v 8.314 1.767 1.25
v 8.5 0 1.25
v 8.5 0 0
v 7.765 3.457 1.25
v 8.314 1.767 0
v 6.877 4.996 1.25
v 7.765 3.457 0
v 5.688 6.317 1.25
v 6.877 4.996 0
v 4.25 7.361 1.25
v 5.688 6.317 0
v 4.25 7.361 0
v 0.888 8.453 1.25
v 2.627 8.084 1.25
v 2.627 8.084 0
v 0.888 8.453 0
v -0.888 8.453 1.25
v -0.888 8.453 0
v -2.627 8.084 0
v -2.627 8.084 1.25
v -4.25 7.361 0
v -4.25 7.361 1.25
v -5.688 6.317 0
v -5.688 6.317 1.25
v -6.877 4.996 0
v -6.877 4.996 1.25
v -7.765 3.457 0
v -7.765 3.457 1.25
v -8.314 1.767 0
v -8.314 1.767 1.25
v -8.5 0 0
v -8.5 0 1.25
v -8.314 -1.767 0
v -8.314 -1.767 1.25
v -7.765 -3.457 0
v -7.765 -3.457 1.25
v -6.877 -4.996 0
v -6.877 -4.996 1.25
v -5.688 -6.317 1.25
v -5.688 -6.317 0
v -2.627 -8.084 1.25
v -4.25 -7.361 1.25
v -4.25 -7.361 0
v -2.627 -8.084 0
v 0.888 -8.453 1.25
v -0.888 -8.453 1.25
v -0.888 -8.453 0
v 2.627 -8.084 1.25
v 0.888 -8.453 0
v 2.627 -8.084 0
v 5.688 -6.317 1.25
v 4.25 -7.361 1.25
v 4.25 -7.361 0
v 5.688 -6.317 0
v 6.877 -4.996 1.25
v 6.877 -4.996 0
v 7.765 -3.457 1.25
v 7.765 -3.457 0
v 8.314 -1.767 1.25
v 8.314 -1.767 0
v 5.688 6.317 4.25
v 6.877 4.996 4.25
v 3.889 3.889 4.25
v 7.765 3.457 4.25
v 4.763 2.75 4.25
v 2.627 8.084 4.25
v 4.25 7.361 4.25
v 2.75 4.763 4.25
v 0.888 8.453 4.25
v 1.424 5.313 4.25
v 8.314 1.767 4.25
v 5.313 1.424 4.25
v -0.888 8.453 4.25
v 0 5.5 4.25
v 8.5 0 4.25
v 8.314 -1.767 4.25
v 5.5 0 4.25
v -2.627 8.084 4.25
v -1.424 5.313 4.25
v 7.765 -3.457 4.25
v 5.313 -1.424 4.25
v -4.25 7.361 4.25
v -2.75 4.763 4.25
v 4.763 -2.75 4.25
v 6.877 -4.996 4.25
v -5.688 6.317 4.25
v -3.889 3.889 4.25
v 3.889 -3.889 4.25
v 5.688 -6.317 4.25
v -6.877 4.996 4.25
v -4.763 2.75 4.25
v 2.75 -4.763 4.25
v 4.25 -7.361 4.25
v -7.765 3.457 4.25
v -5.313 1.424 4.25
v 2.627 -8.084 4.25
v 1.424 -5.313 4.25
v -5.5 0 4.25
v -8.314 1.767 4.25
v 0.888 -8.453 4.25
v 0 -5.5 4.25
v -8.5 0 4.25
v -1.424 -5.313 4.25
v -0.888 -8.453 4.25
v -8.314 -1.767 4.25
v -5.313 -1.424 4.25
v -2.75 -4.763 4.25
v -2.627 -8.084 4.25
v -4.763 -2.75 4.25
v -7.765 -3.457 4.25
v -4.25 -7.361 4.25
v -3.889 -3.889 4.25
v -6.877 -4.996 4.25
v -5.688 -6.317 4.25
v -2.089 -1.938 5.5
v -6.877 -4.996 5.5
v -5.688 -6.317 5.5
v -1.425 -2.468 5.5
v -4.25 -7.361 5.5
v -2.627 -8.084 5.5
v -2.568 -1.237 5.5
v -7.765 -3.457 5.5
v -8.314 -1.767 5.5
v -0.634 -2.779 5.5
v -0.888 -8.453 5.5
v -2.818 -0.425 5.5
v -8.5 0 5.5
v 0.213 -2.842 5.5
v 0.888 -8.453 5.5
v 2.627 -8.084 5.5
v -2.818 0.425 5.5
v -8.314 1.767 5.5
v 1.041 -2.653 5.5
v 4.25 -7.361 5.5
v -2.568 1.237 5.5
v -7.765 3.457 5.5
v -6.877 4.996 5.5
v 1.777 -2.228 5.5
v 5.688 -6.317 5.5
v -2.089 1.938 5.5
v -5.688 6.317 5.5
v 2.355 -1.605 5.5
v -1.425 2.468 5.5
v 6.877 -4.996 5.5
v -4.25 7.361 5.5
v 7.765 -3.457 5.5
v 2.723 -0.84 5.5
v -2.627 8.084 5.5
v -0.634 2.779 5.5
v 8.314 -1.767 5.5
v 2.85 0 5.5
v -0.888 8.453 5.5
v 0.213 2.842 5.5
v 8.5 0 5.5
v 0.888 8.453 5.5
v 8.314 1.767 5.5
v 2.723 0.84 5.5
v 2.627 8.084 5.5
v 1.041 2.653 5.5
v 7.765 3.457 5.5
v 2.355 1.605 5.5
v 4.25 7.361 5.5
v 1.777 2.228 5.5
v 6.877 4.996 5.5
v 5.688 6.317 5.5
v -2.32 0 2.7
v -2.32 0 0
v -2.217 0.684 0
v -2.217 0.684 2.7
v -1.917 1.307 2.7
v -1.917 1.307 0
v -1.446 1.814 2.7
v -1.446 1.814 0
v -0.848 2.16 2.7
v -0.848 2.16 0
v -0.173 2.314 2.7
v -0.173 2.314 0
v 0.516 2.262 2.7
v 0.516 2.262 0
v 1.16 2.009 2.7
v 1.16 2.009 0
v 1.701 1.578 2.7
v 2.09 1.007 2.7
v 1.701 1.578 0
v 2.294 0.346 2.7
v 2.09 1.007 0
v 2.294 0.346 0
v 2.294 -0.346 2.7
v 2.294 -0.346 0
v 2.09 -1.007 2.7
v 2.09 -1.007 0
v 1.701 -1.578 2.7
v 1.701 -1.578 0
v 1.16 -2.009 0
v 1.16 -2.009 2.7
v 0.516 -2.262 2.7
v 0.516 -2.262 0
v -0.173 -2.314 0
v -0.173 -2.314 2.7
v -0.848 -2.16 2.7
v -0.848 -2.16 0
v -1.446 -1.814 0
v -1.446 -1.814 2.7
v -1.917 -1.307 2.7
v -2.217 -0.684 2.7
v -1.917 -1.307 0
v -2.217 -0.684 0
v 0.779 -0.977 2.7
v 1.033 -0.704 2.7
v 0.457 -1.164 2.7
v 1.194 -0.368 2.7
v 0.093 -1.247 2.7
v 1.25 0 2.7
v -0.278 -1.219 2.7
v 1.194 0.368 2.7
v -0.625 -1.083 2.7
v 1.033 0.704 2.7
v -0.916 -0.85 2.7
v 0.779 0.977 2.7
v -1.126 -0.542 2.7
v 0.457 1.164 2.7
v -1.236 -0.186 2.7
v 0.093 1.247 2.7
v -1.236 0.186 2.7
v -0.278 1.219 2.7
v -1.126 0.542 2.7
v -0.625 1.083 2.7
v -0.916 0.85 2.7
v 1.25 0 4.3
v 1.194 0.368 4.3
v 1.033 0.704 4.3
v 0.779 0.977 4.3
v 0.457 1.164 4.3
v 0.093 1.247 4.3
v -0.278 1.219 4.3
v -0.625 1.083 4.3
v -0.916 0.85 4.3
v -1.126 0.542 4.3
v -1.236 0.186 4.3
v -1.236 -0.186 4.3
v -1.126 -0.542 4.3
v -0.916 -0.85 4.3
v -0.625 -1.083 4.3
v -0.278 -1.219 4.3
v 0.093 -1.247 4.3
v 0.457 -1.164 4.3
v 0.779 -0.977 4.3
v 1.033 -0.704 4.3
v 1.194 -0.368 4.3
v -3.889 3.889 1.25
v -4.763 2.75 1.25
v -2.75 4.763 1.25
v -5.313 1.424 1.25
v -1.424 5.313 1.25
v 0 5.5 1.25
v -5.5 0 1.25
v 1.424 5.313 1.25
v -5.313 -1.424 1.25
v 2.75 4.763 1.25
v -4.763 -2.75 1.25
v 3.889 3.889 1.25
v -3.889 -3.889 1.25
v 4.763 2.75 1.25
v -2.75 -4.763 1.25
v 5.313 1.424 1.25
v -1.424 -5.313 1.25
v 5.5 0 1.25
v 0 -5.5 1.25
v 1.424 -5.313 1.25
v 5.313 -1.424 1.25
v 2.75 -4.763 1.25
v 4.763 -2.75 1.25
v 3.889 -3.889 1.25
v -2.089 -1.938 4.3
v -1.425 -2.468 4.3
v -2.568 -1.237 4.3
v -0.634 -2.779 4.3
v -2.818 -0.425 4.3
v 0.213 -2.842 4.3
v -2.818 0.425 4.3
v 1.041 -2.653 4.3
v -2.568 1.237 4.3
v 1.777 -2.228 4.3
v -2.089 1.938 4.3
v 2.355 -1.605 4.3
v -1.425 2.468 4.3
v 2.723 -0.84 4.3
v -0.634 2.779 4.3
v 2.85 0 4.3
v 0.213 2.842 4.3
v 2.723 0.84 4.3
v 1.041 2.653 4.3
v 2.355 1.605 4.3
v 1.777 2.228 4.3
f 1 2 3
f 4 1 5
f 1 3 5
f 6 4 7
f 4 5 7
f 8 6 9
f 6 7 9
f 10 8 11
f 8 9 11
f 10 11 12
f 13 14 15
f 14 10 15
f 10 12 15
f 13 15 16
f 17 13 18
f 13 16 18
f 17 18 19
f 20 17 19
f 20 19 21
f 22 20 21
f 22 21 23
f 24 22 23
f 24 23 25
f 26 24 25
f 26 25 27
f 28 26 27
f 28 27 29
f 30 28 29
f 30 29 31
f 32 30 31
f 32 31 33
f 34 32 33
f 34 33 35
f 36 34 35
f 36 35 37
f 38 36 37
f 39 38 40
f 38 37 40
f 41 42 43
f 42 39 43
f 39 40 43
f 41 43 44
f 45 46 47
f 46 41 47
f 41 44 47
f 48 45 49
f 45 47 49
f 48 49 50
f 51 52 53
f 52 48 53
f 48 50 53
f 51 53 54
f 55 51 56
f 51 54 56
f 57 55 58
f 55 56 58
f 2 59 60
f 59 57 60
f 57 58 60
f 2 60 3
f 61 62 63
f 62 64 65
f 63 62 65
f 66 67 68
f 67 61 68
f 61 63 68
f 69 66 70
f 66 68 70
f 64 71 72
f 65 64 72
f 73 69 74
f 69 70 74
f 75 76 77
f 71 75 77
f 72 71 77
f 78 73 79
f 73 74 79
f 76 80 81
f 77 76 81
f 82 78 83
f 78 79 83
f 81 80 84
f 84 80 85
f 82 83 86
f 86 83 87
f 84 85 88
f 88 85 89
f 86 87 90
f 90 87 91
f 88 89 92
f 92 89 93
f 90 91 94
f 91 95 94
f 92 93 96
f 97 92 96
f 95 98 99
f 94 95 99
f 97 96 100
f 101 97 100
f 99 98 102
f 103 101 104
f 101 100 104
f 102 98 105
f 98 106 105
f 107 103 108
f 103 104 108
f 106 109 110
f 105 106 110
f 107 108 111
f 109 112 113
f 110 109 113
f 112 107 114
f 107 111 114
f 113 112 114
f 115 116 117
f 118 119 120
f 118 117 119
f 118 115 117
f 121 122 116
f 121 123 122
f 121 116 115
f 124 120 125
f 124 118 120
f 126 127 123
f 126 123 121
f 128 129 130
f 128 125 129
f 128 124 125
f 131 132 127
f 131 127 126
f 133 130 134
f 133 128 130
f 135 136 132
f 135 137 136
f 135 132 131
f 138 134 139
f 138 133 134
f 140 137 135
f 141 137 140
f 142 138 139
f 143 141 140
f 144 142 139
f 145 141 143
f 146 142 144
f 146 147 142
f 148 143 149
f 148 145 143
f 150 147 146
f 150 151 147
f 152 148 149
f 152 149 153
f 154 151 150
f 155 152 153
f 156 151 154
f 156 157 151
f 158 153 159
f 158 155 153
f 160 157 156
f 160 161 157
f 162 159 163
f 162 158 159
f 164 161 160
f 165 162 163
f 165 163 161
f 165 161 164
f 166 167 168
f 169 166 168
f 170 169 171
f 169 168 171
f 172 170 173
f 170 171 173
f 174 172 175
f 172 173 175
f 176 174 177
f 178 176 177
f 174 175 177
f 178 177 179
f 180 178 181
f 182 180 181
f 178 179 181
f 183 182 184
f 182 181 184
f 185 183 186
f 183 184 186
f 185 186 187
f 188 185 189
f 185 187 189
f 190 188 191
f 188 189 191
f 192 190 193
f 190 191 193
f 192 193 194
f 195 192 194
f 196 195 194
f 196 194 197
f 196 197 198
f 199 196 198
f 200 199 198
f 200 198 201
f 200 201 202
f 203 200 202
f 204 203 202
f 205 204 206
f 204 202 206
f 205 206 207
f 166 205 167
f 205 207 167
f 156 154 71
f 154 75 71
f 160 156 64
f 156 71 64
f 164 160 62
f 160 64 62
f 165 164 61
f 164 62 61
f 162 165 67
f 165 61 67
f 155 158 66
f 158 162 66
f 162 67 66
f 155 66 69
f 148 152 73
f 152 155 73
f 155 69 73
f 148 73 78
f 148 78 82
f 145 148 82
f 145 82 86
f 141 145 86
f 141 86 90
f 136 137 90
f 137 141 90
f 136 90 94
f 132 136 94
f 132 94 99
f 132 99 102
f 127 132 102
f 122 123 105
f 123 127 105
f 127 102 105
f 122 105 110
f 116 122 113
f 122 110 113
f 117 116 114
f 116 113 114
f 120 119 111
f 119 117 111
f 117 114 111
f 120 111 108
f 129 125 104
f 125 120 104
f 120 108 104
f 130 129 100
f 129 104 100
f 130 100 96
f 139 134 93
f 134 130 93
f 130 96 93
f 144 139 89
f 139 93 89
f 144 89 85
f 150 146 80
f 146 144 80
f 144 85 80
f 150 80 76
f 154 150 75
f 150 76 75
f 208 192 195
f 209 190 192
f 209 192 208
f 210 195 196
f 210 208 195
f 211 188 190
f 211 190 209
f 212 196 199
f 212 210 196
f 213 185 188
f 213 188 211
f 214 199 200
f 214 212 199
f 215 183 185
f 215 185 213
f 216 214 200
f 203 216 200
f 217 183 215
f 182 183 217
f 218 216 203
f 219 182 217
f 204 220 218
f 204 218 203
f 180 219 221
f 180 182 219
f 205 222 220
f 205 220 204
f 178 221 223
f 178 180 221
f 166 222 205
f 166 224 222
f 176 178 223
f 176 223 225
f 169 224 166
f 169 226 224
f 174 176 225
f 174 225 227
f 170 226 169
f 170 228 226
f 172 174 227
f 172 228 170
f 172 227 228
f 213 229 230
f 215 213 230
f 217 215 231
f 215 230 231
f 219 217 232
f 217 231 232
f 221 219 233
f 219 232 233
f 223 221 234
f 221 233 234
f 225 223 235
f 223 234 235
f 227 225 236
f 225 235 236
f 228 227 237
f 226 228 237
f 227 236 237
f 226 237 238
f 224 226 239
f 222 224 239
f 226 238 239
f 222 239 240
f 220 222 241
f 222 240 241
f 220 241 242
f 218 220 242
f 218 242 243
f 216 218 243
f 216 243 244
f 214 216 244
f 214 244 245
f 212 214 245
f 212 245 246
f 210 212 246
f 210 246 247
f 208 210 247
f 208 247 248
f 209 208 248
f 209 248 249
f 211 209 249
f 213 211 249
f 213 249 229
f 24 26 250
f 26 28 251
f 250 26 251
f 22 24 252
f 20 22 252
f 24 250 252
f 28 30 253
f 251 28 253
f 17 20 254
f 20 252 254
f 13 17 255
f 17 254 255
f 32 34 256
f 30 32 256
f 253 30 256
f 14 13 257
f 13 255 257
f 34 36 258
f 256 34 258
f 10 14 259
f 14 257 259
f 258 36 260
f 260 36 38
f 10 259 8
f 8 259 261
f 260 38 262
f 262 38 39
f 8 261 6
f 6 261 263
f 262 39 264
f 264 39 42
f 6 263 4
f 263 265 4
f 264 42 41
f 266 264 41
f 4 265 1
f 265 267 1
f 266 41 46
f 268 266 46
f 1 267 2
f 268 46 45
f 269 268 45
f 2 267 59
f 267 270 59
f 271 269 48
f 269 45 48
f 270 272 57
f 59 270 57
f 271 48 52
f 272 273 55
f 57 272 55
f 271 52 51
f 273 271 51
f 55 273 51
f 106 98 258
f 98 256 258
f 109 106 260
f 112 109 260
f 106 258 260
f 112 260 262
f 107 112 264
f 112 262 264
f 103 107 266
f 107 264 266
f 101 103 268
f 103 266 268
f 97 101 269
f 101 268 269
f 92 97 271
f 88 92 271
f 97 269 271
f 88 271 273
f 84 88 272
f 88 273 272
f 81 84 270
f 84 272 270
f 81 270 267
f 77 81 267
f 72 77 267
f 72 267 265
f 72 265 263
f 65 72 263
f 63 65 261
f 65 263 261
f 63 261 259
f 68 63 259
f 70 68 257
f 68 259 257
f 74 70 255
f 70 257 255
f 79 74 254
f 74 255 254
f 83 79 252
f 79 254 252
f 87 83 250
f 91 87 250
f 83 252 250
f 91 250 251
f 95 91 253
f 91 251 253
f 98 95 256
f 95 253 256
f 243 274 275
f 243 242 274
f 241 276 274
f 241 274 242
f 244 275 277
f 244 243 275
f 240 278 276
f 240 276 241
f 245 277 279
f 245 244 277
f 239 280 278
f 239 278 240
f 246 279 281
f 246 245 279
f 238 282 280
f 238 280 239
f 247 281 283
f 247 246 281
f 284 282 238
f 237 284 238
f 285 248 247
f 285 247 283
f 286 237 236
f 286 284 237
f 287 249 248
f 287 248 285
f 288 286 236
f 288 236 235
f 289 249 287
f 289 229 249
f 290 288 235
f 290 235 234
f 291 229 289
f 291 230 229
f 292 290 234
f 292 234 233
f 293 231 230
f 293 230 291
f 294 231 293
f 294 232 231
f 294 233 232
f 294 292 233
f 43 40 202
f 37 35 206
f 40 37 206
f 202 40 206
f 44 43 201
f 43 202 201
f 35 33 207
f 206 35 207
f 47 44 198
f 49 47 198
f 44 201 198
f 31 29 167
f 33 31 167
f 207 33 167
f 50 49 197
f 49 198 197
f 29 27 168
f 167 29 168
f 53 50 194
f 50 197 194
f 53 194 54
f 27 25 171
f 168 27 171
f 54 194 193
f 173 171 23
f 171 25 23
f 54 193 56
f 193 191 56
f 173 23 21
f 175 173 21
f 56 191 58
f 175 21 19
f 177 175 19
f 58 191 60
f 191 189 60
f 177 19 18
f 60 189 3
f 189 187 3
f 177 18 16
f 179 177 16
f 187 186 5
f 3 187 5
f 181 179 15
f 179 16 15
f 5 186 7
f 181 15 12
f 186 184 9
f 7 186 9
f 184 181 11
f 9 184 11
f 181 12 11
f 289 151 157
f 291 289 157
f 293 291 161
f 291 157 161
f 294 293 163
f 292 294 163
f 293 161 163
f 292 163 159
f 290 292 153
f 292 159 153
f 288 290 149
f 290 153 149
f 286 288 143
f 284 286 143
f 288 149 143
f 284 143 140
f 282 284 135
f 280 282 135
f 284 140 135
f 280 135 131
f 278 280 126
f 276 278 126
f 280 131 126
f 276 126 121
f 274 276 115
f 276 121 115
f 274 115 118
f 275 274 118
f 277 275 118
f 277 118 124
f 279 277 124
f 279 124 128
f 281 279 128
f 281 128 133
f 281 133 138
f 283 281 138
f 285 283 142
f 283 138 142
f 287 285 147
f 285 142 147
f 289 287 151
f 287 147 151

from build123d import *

# Parameters (mm, degrees)
CROQUIS1_R              = 8.5
SALIENTE_EXTRUIR1_DEPTH = 5.5
CROQUIS3_R              = 2.85
CORTAR_EXTRUIR1_DEPTH   = 1.2
CROQUIS4_R              = 1.25
CORTAR_EXTRUIR2_DEPTH   = 14.219304066
CROQUIS5_R              = 2.32
CORTAR_EXTRUIR3_DEPTH   = 2.7


with BuildPart() as part:
    # Croquis1 → Saliente-Extruir1 (new body)
    with BuildSketch(Plane.XY):
        Circle(CROQUIS1_R)
    extrude(amount=SALIENTE_EXTRUIR1_DEPTH)

    # Croquis2 → Cortar-Revolución1 (revolve, cut)
    with BuildSketch(Plane(origin=(0, 0, 0), x_dir=(0, 0, -1), z_dir=(1, 0, 0)), mode=Mode.PRIVATE) as cortar_revoluci_n1_sk:
        Polygon((-5.5, 8.5), (-4.25, 8.5), (-4.25, 5.5), (-1.25, 5.5), (-1.25, 8.5), (0, 8.5), (0, 8.952172256), (-5.5, 8.952172256), align=None)
    revolve(cortar_revoluci_n1_sk.sketch.rotate(Axis((0, 0, 0), (0, 0, 1)), 90), axis=Axis((0, 0, 0), (0, 0, 1)), mode=Mode.SUBTRACT)

    # Croquis3 → Cortar-Extruir1 (cut)
    with BuildSketch(Plane.XY.offset(5.5)):
        Circle(CROQUIS3_R)
    extrude(amount=-CORTAR_EXTRUIR1_DEPTH, mode=Mode.SUBTRACT)

    # Croquis4 → Cortar-Extruir2 (cut, through all)
    with BuildSketch(Plane.XY.offset(5.5)):
        Circle(CROQUIS4_R)
    extrude(amount=-CORTAR_EXTRUIR2_DEPTH, mode=Mode.SUBTRACT)

    # Croquis5 → Cortar-Extruir3 (cut)
    with BuildSketch(Plane(origin=(0, 0, 0), x_dir=(-1, 0, 0), z_dir=(0, 0, -1))):
        Circle(CROQUIS5_R)
    extrude(amount=-CORTAR_EXTRUIR3_DEPTH, mode=Mode.SUBTRACT)


solid = part.part
